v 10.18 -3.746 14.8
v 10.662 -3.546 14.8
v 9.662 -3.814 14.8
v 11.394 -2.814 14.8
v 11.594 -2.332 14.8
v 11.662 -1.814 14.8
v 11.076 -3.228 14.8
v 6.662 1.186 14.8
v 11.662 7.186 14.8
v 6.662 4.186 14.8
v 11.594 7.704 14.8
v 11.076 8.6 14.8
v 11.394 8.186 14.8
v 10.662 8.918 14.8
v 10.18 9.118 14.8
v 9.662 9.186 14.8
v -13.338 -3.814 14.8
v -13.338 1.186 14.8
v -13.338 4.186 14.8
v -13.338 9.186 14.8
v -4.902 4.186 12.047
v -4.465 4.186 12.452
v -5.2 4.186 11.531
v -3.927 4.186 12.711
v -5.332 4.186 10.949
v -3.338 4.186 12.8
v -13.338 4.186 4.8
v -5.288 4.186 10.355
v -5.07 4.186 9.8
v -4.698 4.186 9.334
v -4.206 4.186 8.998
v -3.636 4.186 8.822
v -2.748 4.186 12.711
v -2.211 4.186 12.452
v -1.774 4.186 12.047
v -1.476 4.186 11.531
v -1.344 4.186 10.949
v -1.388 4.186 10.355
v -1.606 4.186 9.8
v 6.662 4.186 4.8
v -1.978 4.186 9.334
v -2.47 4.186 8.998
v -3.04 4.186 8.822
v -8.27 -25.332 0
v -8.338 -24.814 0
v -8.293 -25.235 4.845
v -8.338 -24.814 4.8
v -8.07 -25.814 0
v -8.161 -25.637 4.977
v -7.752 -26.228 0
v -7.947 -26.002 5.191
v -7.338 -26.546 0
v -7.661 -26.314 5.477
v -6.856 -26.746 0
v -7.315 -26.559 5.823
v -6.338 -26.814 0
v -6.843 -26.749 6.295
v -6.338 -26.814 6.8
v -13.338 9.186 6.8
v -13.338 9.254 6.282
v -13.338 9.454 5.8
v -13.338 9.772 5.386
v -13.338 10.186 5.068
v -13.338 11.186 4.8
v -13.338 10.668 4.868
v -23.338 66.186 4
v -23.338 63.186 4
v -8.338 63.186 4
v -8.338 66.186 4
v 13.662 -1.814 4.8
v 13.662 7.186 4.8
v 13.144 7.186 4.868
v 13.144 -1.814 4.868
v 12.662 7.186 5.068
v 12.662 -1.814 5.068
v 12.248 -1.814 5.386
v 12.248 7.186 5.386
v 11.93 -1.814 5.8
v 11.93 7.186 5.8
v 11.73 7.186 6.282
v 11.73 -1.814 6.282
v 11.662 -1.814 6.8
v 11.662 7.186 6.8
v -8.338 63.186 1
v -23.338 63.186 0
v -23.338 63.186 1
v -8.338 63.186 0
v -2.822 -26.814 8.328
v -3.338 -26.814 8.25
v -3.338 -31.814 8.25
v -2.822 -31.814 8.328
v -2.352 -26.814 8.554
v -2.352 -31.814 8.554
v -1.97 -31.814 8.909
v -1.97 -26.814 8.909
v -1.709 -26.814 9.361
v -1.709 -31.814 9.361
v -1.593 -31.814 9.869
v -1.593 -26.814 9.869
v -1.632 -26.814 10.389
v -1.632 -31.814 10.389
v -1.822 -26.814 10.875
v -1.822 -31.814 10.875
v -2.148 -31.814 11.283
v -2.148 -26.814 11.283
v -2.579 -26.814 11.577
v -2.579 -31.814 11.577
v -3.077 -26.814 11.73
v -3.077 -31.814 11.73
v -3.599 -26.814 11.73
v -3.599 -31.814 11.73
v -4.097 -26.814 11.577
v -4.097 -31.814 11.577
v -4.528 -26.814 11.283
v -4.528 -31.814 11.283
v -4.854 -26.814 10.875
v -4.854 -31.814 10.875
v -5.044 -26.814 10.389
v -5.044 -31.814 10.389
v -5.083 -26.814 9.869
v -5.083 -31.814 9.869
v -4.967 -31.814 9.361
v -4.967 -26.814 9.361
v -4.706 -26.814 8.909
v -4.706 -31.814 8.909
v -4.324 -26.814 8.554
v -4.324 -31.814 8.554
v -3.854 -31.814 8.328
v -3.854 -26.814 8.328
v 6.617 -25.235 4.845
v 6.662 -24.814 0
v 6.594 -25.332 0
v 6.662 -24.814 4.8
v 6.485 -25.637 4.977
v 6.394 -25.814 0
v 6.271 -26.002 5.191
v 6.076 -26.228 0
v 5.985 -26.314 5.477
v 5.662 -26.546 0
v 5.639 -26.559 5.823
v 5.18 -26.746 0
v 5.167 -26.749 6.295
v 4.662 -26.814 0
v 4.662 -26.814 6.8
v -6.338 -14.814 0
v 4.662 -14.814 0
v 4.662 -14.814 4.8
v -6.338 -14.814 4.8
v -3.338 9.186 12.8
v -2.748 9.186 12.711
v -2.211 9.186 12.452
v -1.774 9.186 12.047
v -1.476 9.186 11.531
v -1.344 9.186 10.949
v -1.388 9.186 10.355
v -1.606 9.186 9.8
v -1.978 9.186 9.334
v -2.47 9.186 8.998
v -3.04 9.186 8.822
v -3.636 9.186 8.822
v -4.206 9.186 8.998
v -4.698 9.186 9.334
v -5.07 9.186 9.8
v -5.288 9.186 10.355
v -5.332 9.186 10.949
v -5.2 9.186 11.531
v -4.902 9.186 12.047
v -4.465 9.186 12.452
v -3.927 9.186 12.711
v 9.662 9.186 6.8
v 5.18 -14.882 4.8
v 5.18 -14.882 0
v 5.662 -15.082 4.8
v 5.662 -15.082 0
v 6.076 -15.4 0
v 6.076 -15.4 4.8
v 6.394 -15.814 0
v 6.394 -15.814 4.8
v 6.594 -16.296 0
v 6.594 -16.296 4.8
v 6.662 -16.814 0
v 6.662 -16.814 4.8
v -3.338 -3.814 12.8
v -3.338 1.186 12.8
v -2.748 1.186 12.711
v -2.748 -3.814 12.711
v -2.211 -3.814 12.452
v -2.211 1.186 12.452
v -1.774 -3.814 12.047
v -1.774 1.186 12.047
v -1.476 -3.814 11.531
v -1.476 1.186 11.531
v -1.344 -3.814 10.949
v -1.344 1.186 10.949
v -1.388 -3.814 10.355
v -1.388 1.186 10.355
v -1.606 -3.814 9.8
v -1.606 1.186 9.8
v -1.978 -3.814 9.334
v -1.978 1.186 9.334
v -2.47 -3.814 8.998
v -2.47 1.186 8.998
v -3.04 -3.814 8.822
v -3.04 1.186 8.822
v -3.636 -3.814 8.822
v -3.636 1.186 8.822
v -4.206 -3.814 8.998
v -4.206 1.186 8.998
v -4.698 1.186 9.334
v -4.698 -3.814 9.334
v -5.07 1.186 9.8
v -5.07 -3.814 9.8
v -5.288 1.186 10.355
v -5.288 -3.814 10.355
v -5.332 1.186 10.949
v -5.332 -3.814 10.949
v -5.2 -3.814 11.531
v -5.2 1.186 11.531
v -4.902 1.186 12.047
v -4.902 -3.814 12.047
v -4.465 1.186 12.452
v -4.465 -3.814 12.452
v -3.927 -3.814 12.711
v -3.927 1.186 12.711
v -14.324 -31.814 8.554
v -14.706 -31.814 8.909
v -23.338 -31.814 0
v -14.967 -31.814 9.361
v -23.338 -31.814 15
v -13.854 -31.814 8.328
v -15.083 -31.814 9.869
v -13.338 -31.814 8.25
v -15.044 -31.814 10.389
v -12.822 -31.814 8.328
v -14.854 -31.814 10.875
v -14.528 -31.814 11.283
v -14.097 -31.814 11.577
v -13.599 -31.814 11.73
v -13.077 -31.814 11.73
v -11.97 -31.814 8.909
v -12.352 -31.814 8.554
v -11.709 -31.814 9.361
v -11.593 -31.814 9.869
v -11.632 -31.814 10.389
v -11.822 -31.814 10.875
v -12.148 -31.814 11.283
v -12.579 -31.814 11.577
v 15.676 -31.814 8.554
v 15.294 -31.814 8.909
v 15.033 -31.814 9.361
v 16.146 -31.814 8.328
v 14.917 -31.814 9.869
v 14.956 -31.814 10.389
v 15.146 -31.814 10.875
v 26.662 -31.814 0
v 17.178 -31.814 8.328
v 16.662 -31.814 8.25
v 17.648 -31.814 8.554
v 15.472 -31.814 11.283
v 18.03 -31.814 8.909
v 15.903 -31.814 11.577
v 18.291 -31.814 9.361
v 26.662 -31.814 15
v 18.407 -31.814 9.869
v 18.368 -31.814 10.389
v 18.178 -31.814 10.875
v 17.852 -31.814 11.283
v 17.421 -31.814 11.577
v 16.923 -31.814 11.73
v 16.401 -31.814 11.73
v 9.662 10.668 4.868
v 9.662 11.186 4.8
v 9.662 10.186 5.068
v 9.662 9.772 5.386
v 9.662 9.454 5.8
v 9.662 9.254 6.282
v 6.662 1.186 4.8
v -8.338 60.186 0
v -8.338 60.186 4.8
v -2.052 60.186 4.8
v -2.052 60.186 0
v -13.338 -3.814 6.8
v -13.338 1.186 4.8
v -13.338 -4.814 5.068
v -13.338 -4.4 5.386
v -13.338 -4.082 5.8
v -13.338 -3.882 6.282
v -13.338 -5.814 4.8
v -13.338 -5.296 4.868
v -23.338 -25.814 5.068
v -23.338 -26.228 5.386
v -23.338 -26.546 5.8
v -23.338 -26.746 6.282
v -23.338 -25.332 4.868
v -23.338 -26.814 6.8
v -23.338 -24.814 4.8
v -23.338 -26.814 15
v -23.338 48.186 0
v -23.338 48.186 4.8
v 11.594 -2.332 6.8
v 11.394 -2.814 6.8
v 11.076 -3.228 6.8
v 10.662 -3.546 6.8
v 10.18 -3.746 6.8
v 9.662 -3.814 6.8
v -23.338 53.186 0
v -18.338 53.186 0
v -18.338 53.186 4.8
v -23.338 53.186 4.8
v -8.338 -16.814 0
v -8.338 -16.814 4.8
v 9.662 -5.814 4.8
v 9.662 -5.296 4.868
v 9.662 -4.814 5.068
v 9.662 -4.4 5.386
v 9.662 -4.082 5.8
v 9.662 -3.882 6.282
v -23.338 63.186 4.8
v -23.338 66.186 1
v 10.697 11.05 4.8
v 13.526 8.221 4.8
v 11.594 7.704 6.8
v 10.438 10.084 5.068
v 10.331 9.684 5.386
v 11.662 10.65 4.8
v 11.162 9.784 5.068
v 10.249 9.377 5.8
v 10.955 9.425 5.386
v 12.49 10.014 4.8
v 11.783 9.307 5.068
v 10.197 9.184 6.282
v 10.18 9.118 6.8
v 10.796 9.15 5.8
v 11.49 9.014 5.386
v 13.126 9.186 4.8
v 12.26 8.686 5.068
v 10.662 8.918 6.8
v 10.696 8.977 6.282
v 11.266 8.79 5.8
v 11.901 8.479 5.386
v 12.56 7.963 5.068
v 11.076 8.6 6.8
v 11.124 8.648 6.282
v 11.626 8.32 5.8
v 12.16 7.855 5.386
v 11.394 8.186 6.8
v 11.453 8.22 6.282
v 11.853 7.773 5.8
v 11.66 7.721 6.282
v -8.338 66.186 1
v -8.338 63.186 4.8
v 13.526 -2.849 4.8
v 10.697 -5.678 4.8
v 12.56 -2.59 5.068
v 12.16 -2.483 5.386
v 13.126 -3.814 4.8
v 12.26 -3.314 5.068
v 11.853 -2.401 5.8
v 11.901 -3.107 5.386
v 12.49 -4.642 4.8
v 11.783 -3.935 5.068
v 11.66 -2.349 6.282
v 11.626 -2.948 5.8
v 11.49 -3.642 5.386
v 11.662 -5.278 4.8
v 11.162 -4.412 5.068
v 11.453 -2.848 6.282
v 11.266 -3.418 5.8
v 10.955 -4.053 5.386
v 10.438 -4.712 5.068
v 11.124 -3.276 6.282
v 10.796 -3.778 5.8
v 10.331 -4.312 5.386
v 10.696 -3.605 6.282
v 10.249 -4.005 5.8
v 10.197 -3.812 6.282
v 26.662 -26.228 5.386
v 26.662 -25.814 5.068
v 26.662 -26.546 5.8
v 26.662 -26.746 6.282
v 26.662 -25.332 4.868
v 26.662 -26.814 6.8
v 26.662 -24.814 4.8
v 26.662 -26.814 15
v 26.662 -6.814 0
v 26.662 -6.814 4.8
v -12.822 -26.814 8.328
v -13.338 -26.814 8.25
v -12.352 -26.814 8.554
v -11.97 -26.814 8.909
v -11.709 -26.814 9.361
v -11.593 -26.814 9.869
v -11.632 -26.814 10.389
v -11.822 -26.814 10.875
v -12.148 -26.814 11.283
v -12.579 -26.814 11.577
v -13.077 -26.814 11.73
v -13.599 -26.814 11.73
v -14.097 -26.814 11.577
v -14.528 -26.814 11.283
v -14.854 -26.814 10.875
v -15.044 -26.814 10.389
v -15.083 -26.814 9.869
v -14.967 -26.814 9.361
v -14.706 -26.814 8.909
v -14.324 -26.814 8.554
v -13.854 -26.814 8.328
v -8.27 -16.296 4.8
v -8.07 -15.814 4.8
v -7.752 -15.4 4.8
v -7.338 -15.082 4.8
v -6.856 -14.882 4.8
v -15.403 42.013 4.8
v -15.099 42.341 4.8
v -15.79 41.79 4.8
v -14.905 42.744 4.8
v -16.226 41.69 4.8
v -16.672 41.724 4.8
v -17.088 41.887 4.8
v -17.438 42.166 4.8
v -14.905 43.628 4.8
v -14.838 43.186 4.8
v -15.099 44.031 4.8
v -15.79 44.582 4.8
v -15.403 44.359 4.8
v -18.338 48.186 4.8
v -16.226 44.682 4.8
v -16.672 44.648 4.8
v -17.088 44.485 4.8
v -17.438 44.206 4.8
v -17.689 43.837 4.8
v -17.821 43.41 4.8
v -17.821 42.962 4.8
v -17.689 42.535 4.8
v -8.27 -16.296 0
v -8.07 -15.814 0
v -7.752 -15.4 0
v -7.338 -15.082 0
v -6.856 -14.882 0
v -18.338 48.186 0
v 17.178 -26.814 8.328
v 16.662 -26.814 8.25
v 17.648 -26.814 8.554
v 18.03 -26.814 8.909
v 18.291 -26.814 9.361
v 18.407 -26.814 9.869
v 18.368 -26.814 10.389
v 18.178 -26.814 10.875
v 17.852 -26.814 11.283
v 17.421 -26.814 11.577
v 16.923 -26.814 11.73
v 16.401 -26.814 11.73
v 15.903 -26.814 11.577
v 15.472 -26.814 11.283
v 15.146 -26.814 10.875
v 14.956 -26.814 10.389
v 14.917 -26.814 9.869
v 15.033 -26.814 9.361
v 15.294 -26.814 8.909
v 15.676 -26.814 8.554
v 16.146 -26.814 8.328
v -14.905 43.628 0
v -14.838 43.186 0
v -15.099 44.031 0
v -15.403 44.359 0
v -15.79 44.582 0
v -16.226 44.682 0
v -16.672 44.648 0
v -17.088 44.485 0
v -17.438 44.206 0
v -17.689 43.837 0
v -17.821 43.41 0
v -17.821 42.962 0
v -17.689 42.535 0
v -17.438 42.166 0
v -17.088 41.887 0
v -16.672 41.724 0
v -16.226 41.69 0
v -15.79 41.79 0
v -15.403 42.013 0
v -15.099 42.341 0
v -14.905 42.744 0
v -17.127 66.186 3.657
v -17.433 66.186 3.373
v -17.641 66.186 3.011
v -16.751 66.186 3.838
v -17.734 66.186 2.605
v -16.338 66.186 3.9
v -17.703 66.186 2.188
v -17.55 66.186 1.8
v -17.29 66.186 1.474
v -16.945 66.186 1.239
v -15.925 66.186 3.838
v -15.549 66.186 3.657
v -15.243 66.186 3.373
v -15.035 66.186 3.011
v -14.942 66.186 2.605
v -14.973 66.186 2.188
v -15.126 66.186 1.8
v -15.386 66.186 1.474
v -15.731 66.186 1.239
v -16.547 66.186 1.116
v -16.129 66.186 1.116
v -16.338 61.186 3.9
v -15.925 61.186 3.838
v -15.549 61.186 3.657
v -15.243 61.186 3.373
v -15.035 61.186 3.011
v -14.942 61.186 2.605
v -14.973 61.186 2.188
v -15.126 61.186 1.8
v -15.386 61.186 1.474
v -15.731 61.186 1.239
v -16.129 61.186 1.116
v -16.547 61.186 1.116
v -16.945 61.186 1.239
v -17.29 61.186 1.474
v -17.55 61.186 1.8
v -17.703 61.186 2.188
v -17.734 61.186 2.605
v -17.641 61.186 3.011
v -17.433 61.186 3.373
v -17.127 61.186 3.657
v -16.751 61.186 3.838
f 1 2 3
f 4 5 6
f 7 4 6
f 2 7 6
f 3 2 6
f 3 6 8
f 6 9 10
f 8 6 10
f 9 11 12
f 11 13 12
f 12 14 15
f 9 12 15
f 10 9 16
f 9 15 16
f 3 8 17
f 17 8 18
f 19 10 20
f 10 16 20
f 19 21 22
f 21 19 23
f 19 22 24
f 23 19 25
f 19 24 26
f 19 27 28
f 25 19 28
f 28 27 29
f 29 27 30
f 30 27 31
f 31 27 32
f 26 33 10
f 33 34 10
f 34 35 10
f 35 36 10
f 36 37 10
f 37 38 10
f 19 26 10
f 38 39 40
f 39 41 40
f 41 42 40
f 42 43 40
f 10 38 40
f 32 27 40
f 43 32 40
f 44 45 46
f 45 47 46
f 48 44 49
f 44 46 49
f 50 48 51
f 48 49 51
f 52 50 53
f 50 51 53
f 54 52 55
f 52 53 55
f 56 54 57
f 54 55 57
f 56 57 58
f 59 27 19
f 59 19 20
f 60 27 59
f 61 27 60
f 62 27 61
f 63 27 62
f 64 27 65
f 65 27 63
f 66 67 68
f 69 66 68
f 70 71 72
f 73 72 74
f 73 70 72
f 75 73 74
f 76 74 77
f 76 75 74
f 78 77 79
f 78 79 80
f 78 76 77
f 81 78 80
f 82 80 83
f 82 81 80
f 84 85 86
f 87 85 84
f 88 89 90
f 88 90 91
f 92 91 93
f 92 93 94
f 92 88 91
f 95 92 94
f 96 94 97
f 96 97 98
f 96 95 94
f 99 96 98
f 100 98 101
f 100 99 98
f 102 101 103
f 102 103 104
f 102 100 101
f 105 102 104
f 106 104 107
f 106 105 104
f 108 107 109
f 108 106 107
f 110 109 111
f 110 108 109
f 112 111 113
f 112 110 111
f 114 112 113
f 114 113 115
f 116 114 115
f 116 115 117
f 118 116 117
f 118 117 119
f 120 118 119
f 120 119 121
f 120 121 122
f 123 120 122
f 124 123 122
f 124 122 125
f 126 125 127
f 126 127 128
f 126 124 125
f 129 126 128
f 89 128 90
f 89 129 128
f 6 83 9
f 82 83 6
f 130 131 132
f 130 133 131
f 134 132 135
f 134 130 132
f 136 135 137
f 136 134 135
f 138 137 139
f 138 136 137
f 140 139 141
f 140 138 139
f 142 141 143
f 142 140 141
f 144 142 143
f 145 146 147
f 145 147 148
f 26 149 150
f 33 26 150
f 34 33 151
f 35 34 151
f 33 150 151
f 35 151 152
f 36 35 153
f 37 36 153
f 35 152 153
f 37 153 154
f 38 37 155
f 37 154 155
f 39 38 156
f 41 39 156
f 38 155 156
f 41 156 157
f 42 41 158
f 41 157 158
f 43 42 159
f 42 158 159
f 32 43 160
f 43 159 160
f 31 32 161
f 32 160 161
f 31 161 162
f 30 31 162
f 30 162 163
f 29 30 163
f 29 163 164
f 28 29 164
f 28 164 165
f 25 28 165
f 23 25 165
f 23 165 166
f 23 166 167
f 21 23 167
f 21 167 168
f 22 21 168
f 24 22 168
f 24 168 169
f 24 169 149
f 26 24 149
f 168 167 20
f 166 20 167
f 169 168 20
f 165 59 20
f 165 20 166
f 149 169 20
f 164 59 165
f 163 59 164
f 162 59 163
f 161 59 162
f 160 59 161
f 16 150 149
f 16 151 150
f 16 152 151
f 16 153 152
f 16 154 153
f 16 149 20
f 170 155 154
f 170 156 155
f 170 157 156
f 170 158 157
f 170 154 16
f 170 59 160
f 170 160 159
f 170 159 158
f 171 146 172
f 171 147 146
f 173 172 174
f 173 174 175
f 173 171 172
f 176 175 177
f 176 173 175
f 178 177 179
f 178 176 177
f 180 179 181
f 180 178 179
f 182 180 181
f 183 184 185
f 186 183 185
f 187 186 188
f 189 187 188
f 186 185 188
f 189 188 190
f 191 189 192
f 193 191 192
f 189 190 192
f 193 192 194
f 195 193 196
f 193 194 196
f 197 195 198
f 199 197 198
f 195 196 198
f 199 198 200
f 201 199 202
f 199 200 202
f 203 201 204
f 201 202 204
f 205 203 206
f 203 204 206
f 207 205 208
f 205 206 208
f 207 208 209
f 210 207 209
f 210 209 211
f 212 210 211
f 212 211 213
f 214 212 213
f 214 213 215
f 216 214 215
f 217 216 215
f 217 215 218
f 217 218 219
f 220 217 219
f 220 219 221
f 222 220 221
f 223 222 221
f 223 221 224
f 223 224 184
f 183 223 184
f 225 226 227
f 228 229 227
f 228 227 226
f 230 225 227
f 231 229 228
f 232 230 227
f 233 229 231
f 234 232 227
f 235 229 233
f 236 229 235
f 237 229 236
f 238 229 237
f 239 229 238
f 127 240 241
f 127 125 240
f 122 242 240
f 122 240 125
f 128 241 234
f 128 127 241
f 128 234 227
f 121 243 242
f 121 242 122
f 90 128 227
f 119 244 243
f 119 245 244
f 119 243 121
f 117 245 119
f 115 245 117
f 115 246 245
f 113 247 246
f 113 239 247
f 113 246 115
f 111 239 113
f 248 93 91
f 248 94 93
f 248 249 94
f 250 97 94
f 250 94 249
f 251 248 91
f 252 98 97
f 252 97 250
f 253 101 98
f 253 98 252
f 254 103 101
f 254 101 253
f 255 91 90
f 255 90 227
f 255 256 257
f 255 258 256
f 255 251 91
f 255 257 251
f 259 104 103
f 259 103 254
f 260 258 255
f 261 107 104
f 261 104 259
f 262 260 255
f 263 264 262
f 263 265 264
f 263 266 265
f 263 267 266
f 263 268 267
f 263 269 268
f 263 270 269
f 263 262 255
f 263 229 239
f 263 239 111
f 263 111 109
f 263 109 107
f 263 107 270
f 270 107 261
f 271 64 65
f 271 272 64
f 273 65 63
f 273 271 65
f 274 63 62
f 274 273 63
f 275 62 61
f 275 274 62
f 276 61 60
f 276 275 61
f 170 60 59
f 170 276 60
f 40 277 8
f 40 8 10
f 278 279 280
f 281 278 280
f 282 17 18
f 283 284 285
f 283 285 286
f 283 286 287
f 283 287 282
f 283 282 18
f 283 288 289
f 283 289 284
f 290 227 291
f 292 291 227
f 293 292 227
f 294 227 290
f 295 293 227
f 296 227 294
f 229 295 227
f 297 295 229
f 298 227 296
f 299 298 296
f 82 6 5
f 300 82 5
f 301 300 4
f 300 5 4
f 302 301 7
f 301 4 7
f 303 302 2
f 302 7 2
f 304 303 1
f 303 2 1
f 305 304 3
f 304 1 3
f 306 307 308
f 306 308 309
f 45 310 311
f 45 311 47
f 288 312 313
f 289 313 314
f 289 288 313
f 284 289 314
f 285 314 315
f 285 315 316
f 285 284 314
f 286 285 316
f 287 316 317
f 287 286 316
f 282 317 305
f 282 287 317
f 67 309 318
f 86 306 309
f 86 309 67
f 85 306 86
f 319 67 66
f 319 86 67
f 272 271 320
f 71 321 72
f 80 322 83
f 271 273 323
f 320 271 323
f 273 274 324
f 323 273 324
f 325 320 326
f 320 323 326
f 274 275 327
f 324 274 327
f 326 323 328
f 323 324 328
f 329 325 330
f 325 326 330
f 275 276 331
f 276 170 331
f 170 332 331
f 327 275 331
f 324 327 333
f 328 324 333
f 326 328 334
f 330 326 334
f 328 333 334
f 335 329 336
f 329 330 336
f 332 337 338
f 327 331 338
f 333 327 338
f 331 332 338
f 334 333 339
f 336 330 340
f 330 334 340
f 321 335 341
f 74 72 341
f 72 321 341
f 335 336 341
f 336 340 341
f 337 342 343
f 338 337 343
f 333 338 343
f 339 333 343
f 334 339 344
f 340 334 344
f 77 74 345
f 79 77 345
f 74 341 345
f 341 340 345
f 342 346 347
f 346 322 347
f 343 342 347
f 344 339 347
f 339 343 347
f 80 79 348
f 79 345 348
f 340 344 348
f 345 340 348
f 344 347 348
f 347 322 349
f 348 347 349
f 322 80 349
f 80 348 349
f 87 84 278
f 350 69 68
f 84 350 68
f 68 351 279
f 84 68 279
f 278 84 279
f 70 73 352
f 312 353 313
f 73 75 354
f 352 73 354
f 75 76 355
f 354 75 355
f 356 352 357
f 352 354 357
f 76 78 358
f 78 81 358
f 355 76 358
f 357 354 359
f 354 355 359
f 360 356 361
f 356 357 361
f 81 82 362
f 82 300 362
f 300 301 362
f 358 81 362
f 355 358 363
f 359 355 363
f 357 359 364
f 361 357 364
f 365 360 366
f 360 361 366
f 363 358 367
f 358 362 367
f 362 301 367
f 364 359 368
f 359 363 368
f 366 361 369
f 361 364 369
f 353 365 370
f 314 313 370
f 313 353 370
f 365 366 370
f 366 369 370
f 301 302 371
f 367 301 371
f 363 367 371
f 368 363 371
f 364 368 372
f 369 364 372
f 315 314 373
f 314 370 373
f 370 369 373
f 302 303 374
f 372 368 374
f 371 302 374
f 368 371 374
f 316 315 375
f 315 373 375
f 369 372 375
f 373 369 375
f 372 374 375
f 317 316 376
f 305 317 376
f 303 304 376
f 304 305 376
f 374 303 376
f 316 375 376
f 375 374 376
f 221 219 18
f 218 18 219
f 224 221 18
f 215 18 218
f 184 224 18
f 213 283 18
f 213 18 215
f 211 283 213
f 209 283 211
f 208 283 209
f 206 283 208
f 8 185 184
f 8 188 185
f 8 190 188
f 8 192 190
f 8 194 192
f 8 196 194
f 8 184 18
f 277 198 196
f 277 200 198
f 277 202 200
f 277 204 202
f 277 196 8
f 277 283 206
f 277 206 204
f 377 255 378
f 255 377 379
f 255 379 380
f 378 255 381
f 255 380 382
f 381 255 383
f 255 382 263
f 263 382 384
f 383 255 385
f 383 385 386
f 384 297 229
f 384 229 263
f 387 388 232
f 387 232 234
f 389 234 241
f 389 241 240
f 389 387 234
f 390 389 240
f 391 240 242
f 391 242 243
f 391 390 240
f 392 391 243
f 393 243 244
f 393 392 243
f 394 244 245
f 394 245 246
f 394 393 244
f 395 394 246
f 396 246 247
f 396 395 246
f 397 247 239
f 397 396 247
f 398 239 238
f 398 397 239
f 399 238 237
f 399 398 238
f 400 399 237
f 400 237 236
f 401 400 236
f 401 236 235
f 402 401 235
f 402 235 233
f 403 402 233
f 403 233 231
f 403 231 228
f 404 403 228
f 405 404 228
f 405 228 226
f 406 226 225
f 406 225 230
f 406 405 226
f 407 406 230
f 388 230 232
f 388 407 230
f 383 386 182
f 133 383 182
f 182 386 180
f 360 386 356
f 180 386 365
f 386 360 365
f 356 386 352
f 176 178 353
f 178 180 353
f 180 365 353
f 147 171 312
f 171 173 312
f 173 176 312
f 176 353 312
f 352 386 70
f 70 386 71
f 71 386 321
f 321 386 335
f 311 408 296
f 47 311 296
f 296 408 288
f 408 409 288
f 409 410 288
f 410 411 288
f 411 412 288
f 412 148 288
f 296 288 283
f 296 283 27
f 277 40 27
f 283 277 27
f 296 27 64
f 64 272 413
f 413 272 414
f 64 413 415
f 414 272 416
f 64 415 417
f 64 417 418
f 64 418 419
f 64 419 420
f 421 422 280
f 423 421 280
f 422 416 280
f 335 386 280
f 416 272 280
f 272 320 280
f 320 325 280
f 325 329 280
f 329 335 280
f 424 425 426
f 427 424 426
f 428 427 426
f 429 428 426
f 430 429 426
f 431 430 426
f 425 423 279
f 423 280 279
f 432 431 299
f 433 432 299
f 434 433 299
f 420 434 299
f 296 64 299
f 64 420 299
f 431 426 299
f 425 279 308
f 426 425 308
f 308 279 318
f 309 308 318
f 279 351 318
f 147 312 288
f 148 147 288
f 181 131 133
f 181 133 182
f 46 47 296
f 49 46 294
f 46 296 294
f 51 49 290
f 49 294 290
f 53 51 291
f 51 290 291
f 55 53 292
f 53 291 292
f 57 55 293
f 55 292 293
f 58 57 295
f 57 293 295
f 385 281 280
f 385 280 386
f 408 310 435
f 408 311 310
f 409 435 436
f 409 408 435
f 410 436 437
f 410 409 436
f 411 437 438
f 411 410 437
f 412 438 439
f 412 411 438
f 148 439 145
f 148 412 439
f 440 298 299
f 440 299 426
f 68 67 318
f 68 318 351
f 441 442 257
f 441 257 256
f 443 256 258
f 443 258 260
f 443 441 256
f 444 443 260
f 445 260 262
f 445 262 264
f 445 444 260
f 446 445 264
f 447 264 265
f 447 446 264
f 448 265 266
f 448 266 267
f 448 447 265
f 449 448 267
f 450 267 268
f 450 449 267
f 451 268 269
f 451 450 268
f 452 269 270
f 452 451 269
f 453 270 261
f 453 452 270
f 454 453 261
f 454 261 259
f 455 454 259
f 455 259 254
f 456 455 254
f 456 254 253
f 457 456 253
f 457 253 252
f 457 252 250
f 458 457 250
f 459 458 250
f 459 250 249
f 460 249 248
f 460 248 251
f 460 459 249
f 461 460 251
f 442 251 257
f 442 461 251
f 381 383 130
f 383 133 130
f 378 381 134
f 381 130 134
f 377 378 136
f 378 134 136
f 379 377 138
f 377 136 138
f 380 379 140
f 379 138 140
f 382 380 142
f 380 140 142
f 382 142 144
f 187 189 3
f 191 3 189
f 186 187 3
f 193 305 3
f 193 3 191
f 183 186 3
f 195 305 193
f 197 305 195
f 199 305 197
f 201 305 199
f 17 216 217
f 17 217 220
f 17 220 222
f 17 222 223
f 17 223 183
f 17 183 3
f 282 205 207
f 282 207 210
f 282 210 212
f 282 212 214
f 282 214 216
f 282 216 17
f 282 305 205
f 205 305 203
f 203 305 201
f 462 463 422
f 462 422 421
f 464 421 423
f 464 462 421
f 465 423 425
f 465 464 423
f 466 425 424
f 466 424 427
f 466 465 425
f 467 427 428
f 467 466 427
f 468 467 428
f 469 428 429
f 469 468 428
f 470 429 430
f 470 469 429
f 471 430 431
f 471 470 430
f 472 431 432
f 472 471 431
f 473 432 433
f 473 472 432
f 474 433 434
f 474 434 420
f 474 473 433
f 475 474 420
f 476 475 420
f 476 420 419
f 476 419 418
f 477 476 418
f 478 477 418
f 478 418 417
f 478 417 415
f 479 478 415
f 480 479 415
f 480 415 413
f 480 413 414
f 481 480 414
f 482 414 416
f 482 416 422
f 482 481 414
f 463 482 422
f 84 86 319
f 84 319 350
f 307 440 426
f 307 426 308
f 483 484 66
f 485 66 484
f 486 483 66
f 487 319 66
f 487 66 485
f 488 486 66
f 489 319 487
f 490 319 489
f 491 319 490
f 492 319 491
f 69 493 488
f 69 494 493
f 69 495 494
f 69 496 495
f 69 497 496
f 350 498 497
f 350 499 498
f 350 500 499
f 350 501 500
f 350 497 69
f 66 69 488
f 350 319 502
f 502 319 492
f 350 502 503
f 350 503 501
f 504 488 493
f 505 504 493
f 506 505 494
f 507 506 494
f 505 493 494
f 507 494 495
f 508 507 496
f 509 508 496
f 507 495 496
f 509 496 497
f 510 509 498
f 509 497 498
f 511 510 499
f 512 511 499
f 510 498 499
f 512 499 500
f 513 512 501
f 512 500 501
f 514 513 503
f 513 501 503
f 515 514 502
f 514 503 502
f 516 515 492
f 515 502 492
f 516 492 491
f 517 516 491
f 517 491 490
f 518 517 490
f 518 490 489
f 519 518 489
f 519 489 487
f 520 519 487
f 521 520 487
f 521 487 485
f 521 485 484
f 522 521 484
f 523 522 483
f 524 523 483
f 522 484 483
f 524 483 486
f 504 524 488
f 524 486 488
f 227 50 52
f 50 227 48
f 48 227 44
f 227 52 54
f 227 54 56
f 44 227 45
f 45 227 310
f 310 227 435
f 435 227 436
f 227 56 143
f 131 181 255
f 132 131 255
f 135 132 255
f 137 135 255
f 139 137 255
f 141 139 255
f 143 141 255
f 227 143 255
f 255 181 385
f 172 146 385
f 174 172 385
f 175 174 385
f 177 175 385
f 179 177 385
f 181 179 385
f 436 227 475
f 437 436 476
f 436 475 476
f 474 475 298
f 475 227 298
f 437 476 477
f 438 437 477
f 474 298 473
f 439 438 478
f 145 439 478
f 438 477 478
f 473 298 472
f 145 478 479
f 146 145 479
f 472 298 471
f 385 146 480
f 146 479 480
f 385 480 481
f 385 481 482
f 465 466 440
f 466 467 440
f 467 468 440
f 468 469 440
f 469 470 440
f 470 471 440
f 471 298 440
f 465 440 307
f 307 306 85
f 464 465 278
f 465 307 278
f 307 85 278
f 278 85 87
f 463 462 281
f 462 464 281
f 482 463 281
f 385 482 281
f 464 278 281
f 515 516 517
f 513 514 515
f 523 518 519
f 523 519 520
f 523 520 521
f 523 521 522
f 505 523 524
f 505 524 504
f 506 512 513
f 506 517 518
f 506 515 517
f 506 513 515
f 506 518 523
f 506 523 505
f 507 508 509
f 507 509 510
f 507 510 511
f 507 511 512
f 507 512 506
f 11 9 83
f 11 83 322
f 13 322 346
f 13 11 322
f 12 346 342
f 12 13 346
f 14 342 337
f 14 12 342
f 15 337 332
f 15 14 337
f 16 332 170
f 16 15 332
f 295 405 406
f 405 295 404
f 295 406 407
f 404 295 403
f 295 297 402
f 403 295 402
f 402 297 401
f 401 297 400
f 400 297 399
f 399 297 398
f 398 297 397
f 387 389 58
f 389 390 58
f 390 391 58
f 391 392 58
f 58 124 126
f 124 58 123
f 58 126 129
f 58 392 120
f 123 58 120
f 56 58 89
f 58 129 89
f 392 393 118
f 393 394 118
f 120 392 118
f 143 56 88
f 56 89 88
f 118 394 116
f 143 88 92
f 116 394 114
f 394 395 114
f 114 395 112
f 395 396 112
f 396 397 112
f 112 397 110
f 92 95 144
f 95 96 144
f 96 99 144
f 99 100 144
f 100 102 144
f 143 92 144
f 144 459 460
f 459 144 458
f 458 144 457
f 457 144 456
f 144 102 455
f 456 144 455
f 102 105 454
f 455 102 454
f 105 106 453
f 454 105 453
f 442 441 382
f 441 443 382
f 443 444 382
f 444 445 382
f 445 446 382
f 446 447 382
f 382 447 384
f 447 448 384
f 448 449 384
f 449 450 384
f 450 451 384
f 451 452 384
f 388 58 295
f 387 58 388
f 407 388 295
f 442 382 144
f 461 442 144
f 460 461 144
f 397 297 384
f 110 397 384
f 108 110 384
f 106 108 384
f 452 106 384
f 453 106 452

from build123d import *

# Parameters (mm, degrees)
SKETCH_1_R          = 1.5
EXTRUDE_1_DEPTH     = 4.8
SKETCH_2_W          = 50
SKETCH_2_H          = 15
SKETCH_2_R          = 1.75
EXTRUDE_2_DEPTH     = 5
EXTRUDE_3_DEPTH     = 10
SKETCH_5_R          = 2
CUT_EXTRUDE_1_DEPTH = 20
FILLET_1_R          = 2
FILLET_2_R          = 2
FILLET_3_R          = 2
SKETCH_6_W          = 15
SKETCH_6_H          = 3
EXTRUDE_5_DEPTH     = 3
SKETCH_7_R          = 1.4
CUT_EXTRUDE_2_DEPTH = 5
CUT_EXTRUDE_3_DEPTH = 73.079801494


with BuildPart() as part:
    # 草图1 → 凸台-拉伸1 (new body)
    with BuildSketch(Plane.XY):
        Polygon((-23.337979748, 53.186059405), (-23.337979748, 63.186059405), (-3.337979748, 63.186059405), (26.662020252, -6.813940595), (26.662020252, -26.813940595), (6.662020252, -26.813940595), (6.662020252, -14.813940595), (-8.337979748, -14.813940595), (-8.337979748, -26.813940595), (-23.337979748, -26.813940595), (-23.337979748, -6.813940595), (-23.337979748, 48.186059405), (-18.337979748, 48.186059405), (-18.337979748, 53.186059405), align=None)
        with Locations((-16.337979748, 43.186059405)):
            Circle(SKETCH_1_R, mode=Mode.SUBTRACT)
    extrude(amount=EXTRUDE_1_DEPTH)

    # 草图2 → 凸台-拉伸2 (add)
    with BuildSketch(Plane.XZ.offset(26.813940595)):
        with Locations((1.662020252, 7.5)):
            Rectangle(SKETCH_2_W, SKETCH_2_H)
        with Locations(Location((-13.337979748, 10, 0), (0, 0, 270))):
            Circle(SKETCH_2_R, mode=Mode.SUBTRACT)
        with Locations(Location((16.662020252, 10, 0), (0, 0, 270))):
            Circle(SKETCH_2_R, mode=Mode.SUBTRACT)
        with Locations(Location((-3.337979748, 10, 0), (0, 0, 270))):
            Circle(SKETCH_2_R, mode=Mode.SUBTRACT)
    extrude(amount=EXTRUDE_2_DEPTH)

    # 草图4 → 凸台-拉伸3 (add)
    with BuildSketch(Plane.XY.offset(4.8)):
        Polygon((11.662020252, 9.186059405), (11.662020252, -3.813940595), (-13.337979748, -3.813940595), (-13.337979748, 1.186059405), (6.662020252, 1.186059405), (6.662020252, 4.186059405), (-3.337979748, 4.186059405), (-13.337979748, 4.186059405), (-13.337979748, 9.186059405), align=None)
    extrude(amount=EXTRUDE_3_DEPTH)

    # 草图5 → 切除-拉伸1 (cut)
    with BuildSketch(Plane(origin=(0, 9.186059405, 0), x_dir=(1, 0, 0), z_dir=(0, 1, 0))):
        with Locations(Location((-3.337979748, -10.8, 0), (0, 0, 270))):
            Circle(SKETCH_5_R)
    extrude(amount=-CUT_EXTRUDE_1_DEPTH, mode=Mode.SUBTRACT)

    # 圆角1
    fillet_1_edges = [part.edges().sort_by_distance(p)[0] for p in [
        (11.662020252, -3.813940595, 9.8),
        (11.662020252, 9.186059405, 9.8),
    ]]
    fillet(fillet_1_edges, radius=FILLET_1_R)

    # 圆角2
    fillet_2_edges = [part.edges().sort_by_distance(p)[0] for p in [
        (-1.837979748, 9.186059405, 4.8),
        (11.076233814, -3.228154158, 4.8),
        (11.076233814, 8.600272967, 4.8),
        (-1.837979748, -3.813940595, 4.8),
        (11.662020252, 2.686059405, 4.8),
    ]]
    fillet(fillet_2_edges, radius=FILLET_2_R)

    # 圆角3
    fillet_3_edges = [part.edges().sort_by_distance(p)[0] for p in [
        (-15.837979748, -26.813940595, 4.8),
        (6.662020252, -26.813940595, 2.4),
        (6.662020252, -14.813940595, 2.4),
        (-8.337979748, -14.813940595, 2.4),
        (-8.337979748, -26.813940595, 2.4),
        (16.662020252, -26.813940595, 4.8),
    ]]
    fillet(fillet_3_edges, radius=FILLET_3_R)

    # 草图6 → 凸台-拉伸5 (add)
    with BuildSketch(Plane(origin=(0, 63.186059405, 0), x_dir=(1, 0, 0), z_dir=(0, 1, 0))):
        with Locations((-15.837979748, -2.5)):
            Rectangle(SKETCH_6_W, SKETCH_6_H)
    extrude(amount=EXTRUDE_5_DEPTH)

    # 草图7 → 切除-拉伸2 (cut)
    with BuildSketch(Plane(origin=(0, 66.186059405, 0), x_dir=(1, 0, 0), z_dir=(0, 1, 0))):
        with Locations(Location((-16.337979748, -2.5, 0), (0, 0, 270))):
            Circle(SKETCH_7_R)
    extrude(amount=-CUT_EXTRUDE_2_DEPTH, mode=Mode.SUBTRACT)

    # 草图8 → 切除-拉伸3 (cut, through all)
    with BuildSketch(Plane.XY.offset(4.8)):
        Polygon((-8.337979748, 63.186059405), (-8.337979748, 60.186059405), (-2.052265462, 60.186059405), (-3.337979748, 63.186059405), align=None)
    extrude(amount=-CUT_EXTRUDE_3_DEPTH, mode=Mode.SUBTRACT)


solid = part.part
